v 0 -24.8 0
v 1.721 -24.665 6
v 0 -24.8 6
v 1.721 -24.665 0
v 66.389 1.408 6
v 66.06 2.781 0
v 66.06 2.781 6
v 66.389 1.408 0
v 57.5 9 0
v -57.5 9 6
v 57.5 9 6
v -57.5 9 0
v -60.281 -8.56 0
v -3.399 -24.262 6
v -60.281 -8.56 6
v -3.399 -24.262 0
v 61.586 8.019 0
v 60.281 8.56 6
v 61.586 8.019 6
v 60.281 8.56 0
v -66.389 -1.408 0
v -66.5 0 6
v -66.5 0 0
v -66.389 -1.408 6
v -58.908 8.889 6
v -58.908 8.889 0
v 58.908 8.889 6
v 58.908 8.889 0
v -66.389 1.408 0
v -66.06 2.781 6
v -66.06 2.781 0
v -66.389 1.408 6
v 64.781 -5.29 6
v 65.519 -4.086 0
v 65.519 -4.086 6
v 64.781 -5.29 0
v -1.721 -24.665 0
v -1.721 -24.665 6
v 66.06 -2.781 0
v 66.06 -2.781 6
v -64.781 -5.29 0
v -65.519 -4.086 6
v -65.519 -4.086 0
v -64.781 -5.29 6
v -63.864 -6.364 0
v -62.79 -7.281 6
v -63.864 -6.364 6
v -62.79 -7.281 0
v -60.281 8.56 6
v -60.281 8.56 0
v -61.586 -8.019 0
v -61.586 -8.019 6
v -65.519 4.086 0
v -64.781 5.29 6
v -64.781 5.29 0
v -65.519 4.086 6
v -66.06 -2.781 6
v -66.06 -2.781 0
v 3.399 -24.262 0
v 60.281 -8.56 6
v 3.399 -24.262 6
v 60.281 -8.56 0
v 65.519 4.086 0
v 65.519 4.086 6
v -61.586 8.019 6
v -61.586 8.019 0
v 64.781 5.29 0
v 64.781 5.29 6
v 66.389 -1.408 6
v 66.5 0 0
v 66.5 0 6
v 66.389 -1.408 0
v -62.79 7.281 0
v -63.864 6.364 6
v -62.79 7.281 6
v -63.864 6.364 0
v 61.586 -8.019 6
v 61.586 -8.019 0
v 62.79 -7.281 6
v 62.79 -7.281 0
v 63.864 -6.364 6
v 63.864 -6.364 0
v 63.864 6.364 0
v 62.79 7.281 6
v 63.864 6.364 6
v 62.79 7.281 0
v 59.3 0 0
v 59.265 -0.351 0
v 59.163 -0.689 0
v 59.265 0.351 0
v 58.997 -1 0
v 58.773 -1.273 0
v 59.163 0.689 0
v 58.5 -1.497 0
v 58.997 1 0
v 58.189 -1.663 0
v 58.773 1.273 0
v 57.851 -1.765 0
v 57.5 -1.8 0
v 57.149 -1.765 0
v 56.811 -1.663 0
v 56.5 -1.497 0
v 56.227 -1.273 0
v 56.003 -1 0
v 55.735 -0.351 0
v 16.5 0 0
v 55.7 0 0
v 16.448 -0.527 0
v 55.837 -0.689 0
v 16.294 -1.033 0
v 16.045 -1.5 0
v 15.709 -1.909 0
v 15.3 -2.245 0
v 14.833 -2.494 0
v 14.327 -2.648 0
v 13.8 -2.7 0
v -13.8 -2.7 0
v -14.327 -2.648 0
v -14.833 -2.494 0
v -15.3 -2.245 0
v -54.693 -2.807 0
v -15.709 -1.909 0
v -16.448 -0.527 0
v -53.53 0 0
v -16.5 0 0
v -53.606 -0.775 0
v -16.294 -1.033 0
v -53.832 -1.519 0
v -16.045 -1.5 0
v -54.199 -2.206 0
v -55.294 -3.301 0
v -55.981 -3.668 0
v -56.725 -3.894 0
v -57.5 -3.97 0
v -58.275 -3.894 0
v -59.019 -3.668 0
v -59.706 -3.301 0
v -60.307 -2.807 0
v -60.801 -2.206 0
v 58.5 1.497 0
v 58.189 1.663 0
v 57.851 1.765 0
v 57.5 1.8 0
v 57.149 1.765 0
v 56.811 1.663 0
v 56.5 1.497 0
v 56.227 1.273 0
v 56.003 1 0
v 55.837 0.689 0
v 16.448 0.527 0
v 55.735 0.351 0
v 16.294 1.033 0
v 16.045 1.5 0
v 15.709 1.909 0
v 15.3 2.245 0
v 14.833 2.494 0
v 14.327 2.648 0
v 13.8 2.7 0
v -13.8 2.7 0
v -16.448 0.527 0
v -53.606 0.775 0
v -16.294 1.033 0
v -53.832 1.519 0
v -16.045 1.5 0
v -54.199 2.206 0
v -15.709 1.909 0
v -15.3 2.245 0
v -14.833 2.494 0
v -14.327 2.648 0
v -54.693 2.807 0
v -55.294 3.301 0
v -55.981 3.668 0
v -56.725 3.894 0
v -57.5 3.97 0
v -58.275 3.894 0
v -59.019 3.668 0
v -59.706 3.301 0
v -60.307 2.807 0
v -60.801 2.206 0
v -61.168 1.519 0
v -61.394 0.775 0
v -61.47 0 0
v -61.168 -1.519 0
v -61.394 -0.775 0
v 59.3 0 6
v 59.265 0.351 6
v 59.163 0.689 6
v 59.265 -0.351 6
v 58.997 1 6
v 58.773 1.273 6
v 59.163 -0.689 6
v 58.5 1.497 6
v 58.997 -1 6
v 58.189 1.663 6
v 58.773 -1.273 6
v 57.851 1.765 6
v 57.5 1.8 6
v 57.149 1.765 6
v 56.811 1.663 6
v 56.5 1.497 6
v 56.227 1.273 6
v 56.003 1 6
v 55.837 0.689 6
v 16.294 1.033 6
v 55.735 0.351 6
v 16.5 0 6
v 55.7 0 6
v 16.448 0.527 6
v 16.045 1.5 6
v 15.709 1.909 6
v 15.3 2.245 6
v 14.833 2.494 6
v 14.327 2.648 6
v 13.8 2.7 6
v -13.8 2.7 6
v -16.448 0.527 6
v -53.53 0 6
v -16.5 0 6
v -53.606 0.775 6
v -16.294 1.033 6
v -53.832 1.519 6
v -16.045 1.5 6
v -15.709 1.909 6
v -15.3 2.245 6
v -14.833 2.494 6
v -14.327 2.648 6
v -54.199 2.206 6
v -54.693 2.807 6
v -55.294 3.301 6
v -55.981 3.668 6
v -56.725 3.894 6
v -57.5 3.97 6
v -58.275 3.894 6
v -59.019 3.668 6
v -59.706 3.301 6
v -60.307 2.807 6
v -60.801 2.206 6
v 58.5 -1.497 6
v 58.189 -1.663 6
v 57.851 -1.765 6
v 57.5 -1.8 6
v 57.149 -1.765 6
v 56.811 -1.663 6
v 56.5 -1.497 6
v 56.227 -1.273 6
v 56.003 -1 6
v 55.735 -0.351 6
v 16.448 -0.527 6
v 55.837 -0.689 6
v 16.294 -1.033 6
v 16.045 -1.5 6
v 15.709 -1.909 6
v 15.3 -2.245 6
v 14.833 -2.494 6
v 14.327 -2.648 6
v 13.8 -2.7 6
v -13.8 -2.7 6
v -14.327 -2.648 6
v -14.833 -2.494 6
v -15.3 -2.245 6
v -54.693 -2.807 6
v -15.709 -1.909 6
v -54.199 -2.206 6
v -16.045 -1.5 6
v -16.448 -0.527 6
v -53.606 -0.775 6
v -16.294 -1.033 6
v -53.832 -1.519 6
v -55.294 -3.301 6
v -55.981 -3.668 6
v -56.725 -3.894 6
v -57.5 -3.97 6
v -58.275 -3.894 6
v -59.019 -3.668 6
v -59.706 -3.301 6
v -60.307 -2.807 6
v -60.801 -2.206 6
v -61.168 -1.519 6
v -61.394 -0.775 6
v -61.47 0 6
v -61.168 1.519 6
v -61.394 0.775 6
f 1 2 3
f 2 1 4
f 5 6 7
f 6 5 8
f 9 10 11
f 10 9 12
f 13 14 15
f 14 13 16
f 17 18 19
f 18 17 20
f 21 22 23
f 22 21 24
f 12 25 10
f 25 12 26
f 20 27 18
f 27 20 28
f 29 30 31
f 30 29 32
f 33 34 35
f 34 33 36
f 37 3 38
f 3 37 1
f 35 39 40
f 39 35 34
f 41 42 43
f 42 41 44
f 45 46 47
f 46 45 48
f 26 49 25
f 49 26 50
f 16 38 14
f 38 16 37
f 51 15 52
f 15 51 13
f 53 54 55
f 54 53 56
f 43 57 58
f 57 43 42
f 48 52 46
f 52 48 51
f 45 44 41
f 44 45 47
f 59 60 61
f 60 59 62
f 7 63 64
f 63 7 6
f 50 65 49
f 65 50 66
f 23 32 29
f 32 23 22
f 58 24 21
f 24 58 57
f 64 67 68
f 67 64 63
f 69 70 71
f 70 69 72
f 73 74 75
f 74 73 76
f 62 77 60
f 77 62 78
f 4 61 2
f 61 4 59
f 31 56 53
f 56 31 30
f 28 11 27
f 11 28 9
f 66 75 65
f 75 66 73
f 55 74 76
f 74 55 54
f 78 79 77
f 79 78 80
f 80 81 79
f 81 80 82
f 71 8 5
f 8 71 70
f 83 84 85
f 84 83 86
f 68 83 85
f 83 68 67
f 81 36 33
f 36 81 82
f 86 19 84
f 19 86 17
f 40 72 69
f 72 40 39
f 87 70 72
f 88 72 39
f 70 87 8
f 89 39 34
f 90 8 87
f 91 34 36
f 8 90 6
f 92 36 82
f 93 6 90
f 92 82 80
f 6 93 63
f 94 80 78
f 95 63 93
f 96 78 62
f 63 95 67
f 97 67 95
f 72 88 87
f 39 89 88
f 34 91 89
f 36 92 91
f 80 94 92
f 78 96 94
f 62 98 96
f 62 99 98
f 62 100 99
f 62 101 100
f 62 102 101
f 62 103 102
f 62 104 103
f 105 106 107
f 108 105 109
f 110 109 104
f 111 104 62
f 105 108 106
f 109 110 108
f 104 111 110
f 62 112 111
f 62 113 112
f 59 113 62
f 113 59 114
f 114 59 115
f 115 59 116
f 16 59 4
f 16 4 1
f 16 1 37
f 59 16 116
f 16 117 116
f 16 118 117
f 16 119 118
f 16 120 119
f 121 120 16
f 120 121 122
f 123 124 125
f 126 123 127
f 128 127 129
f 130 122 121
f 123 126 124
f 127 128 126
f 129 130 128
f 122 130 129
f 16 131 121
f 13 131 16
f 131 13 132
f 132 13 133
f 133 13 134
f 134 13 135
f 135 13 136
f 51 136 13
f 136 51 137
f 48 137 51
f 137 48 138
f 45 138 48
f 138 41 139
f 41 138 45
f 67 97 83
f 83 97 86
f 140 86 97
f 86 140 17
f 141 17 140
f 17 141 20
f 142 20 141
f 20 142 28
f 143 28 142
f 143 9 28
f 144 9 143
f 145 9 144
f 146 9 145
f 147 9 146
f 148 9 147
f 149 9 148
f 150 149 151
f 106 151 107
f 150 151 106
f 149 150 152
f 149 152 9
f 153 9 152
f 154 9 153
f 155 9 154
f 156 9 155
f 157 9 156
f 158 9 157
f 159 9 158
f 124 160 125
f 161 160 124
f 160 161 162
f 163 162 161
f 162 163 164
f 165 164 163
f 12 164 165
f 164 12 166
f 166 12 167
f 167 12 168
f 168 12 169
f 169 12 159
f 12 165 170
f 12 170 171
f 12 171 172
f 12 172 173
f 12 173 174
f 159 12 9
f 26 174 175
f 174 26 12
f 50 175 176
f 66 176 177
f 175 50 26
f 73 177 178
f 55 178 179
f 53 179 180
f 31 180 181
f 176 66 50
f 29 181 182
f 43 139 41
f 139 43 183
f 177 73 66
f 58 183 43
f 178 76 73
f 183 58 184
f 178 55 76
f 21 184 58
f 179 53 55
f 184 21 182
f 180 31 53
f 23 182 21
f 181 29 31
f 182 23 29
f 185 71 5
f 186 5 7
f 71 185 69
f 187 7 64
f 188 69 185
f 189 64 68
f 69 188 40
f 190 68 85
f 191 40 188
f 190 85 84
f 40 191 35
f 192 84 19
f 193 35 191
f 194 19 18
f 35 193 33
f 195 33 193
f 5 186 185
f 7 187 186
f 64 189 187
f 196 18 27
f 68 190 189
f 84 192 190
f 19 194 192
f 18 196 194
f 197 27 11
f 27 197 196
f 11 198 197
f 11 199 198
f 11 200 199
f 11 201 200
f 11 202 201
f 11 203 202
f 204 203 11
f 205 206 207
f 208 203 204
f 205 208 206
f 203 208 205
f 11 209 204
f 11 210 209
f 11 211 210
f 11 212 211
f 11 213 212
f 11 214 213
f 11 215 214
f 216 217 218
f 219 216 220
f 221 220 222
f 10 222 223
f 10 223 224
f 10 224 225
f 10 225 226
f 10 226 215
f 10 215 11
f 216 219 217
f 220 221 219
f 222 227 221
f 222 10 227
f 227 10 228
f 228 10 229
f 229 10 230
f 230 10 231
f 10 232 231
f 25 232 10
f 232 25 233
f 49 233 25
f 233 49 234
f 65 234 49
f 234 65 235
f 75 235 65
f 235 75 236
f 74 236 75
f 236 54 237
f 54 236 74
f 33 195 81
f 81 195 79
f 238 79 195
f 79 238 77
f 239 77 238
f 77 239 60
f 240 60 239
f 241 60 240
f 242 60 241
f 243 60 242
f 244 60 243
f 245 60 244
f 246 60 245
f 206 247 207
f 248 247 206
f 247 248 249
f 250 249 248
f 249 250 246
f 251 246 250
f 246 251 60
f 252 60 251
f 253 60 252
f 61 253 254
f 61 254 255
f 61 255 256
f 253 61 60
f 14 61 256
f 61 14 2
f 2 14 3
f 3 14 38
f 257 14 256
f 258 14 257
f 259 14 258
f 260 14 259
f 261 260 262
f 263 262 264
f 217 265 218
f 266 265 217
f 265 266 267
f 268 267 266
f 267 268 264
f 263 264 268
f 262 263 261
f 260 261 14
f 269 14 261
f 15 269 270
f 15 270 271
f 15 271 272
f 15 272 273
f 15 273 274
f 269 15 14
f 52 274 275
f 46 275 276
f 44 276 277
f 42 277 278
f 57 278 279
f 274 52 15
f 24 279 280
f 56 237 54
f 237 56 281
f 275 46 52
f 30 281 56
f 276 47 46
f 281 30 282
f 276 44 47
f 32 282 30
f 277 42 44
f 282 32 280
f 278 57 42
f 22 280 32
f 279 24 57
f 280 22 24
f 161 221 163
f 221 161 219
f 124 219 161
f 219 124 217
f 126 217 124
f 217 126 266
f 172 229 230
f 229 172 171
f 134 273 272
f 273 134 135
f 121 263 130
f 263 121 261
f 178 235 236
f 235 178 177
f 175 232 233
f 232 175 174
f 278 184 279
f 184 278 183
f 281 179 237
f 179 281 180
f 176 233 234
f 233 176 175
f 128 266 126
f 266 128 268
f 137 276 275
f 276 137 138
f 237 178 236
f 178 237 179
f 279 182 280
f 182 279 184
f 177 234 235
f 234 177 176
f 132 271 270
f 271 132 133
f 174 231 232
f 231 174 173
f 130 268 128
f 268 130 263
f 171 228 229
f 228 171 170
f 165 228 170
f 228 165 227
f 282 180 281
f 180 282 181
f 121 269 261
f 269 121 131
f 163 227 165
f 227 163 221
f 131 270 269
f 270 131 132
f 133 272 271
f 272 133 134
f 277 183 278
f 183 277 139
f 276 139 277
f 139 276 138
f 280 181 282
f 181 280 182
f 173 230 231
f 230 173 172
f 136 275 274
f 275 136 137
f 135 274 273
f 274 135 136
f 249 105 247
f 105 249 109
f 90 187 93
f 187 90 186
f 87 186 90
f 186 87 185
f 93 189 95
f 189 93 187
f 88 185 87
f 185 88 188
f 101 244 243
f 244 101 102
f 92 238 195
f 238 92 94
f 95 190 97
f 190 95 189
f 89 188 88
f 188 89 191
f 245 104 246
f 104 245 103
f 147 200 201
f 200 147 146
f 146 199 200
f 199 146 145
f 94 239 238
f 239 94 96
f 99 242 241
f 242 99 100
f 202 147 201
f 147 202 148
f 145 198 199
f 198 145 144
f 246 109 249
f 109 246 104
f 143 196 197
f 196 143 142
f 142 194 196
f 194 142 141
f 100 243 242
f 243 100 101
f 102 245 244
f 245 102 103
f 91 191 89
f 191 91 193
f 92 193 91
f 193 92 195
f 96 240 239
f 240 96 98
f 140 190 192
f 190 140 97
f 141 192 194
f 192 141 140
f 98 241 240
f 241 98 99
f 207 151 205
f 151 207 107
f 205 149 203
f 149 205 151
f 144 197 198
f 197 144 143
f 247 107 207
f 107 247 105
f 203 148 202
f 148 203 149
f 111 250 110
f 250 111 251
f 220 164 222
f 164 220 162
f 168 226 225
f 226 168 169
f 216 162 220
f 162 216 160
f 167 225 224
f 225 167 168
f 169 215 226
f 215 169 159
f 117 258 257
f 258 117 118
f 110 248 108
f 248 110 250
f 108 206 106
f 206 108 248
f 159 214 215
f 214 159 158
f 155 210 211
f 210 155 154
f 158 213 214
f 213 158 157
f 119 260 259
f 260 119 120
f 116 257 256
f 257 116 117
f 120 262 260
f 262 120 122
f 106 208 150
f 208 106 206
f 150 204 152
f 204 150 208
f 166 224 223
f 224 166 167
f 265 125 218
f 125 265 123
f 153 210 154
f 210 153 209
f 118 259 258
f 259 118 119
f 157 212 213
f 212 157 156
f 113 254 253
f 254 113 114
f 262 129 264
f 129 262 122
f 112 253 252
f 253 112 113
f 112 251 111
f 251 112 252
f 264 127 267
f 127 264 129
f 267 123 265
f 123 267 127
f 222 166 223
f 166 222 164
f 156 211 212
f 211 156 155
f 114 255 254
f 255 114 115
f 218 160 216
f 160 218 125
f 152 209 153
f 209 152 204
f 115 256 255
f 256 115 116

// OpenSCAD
$fn = 32;

// ----------------------------------------------------------------------
// Lever: 115 mm between the bosses, 6 mm thick, smooth outline
// ----------------------------------------------------------------------

// --- parameters (mm) ---
lever_l = 115;            // distance between the boss centres
boss_a = 18;              // first boss diameter
boss_b = 18;              // second boss diameter
bore_a = 7.94;            // first bore
bore_b = 3.6;             // second bore
lever_t = 6;              // lever thickness
boss_c = 22;              // middle boss diameter
bend = 13.8;              // how far the middle boss drops
slot_w = 5.4;             // adjustment slot width

lever_profile = [[-66.5, 0], [-66.389, -1.408], [-66.06, -2.781], [-65.519, -4.086], [-64.781, -5.29], [-63.864, -6.364], [-62.79, -7.281], [-61.586, -8.019], [-60.281, -8.56], [-3.399, -24.262], [-1.721, -24.665], [0, -24.8], [1.721, -24.665], [3.399, -24.262], [60.281, -8.56], [61.586, -8.019], [62.79, -7.281], [63.864, -6.364], [64.781, -5.29], [65.519, -4.086], [66.06, -2.781], [66.389, -1.408], [66.5, 0], [66.389, 1.408], [66.06, 2.781], [65.519, 4.086], [64.781, 5.29], [63.864, 6.364], [62.79, 7.281], [61.586, 8.019], [60.281, 8.56], [58.908, 8.889], [57.5, 9], [-57.5, 9], [-58.908, 8.889], [-60.281, 8.56], [-61.586, 8.019], [-62.79, 7.281], [-63.864, 6.364], [-64.781, 5.29], [-65.519, 4.086], [-66.06, 2.781], [-66.389, 1.408]];

difference() {
  linear_extrude(height = lever_t) polygon(lever_profile);
  translate([-57.5, 0, -2.5]) cylinder(h = lever_t + 5, d = bore_a);
  translate([57.5, 0, -2.5]) cylinder(h = lever_t + 5, d = bore_b);
  /* slotted adjustment, stadium shaped */
  hull() {
    translate([-13.8, 0, -2.5]) cylinder(h = lever_t + 5, d = slot_w);
    translate([13.8, 0, -2.5]) cylinder(h = lever_t + 5, d = slot_w);
  }
}
